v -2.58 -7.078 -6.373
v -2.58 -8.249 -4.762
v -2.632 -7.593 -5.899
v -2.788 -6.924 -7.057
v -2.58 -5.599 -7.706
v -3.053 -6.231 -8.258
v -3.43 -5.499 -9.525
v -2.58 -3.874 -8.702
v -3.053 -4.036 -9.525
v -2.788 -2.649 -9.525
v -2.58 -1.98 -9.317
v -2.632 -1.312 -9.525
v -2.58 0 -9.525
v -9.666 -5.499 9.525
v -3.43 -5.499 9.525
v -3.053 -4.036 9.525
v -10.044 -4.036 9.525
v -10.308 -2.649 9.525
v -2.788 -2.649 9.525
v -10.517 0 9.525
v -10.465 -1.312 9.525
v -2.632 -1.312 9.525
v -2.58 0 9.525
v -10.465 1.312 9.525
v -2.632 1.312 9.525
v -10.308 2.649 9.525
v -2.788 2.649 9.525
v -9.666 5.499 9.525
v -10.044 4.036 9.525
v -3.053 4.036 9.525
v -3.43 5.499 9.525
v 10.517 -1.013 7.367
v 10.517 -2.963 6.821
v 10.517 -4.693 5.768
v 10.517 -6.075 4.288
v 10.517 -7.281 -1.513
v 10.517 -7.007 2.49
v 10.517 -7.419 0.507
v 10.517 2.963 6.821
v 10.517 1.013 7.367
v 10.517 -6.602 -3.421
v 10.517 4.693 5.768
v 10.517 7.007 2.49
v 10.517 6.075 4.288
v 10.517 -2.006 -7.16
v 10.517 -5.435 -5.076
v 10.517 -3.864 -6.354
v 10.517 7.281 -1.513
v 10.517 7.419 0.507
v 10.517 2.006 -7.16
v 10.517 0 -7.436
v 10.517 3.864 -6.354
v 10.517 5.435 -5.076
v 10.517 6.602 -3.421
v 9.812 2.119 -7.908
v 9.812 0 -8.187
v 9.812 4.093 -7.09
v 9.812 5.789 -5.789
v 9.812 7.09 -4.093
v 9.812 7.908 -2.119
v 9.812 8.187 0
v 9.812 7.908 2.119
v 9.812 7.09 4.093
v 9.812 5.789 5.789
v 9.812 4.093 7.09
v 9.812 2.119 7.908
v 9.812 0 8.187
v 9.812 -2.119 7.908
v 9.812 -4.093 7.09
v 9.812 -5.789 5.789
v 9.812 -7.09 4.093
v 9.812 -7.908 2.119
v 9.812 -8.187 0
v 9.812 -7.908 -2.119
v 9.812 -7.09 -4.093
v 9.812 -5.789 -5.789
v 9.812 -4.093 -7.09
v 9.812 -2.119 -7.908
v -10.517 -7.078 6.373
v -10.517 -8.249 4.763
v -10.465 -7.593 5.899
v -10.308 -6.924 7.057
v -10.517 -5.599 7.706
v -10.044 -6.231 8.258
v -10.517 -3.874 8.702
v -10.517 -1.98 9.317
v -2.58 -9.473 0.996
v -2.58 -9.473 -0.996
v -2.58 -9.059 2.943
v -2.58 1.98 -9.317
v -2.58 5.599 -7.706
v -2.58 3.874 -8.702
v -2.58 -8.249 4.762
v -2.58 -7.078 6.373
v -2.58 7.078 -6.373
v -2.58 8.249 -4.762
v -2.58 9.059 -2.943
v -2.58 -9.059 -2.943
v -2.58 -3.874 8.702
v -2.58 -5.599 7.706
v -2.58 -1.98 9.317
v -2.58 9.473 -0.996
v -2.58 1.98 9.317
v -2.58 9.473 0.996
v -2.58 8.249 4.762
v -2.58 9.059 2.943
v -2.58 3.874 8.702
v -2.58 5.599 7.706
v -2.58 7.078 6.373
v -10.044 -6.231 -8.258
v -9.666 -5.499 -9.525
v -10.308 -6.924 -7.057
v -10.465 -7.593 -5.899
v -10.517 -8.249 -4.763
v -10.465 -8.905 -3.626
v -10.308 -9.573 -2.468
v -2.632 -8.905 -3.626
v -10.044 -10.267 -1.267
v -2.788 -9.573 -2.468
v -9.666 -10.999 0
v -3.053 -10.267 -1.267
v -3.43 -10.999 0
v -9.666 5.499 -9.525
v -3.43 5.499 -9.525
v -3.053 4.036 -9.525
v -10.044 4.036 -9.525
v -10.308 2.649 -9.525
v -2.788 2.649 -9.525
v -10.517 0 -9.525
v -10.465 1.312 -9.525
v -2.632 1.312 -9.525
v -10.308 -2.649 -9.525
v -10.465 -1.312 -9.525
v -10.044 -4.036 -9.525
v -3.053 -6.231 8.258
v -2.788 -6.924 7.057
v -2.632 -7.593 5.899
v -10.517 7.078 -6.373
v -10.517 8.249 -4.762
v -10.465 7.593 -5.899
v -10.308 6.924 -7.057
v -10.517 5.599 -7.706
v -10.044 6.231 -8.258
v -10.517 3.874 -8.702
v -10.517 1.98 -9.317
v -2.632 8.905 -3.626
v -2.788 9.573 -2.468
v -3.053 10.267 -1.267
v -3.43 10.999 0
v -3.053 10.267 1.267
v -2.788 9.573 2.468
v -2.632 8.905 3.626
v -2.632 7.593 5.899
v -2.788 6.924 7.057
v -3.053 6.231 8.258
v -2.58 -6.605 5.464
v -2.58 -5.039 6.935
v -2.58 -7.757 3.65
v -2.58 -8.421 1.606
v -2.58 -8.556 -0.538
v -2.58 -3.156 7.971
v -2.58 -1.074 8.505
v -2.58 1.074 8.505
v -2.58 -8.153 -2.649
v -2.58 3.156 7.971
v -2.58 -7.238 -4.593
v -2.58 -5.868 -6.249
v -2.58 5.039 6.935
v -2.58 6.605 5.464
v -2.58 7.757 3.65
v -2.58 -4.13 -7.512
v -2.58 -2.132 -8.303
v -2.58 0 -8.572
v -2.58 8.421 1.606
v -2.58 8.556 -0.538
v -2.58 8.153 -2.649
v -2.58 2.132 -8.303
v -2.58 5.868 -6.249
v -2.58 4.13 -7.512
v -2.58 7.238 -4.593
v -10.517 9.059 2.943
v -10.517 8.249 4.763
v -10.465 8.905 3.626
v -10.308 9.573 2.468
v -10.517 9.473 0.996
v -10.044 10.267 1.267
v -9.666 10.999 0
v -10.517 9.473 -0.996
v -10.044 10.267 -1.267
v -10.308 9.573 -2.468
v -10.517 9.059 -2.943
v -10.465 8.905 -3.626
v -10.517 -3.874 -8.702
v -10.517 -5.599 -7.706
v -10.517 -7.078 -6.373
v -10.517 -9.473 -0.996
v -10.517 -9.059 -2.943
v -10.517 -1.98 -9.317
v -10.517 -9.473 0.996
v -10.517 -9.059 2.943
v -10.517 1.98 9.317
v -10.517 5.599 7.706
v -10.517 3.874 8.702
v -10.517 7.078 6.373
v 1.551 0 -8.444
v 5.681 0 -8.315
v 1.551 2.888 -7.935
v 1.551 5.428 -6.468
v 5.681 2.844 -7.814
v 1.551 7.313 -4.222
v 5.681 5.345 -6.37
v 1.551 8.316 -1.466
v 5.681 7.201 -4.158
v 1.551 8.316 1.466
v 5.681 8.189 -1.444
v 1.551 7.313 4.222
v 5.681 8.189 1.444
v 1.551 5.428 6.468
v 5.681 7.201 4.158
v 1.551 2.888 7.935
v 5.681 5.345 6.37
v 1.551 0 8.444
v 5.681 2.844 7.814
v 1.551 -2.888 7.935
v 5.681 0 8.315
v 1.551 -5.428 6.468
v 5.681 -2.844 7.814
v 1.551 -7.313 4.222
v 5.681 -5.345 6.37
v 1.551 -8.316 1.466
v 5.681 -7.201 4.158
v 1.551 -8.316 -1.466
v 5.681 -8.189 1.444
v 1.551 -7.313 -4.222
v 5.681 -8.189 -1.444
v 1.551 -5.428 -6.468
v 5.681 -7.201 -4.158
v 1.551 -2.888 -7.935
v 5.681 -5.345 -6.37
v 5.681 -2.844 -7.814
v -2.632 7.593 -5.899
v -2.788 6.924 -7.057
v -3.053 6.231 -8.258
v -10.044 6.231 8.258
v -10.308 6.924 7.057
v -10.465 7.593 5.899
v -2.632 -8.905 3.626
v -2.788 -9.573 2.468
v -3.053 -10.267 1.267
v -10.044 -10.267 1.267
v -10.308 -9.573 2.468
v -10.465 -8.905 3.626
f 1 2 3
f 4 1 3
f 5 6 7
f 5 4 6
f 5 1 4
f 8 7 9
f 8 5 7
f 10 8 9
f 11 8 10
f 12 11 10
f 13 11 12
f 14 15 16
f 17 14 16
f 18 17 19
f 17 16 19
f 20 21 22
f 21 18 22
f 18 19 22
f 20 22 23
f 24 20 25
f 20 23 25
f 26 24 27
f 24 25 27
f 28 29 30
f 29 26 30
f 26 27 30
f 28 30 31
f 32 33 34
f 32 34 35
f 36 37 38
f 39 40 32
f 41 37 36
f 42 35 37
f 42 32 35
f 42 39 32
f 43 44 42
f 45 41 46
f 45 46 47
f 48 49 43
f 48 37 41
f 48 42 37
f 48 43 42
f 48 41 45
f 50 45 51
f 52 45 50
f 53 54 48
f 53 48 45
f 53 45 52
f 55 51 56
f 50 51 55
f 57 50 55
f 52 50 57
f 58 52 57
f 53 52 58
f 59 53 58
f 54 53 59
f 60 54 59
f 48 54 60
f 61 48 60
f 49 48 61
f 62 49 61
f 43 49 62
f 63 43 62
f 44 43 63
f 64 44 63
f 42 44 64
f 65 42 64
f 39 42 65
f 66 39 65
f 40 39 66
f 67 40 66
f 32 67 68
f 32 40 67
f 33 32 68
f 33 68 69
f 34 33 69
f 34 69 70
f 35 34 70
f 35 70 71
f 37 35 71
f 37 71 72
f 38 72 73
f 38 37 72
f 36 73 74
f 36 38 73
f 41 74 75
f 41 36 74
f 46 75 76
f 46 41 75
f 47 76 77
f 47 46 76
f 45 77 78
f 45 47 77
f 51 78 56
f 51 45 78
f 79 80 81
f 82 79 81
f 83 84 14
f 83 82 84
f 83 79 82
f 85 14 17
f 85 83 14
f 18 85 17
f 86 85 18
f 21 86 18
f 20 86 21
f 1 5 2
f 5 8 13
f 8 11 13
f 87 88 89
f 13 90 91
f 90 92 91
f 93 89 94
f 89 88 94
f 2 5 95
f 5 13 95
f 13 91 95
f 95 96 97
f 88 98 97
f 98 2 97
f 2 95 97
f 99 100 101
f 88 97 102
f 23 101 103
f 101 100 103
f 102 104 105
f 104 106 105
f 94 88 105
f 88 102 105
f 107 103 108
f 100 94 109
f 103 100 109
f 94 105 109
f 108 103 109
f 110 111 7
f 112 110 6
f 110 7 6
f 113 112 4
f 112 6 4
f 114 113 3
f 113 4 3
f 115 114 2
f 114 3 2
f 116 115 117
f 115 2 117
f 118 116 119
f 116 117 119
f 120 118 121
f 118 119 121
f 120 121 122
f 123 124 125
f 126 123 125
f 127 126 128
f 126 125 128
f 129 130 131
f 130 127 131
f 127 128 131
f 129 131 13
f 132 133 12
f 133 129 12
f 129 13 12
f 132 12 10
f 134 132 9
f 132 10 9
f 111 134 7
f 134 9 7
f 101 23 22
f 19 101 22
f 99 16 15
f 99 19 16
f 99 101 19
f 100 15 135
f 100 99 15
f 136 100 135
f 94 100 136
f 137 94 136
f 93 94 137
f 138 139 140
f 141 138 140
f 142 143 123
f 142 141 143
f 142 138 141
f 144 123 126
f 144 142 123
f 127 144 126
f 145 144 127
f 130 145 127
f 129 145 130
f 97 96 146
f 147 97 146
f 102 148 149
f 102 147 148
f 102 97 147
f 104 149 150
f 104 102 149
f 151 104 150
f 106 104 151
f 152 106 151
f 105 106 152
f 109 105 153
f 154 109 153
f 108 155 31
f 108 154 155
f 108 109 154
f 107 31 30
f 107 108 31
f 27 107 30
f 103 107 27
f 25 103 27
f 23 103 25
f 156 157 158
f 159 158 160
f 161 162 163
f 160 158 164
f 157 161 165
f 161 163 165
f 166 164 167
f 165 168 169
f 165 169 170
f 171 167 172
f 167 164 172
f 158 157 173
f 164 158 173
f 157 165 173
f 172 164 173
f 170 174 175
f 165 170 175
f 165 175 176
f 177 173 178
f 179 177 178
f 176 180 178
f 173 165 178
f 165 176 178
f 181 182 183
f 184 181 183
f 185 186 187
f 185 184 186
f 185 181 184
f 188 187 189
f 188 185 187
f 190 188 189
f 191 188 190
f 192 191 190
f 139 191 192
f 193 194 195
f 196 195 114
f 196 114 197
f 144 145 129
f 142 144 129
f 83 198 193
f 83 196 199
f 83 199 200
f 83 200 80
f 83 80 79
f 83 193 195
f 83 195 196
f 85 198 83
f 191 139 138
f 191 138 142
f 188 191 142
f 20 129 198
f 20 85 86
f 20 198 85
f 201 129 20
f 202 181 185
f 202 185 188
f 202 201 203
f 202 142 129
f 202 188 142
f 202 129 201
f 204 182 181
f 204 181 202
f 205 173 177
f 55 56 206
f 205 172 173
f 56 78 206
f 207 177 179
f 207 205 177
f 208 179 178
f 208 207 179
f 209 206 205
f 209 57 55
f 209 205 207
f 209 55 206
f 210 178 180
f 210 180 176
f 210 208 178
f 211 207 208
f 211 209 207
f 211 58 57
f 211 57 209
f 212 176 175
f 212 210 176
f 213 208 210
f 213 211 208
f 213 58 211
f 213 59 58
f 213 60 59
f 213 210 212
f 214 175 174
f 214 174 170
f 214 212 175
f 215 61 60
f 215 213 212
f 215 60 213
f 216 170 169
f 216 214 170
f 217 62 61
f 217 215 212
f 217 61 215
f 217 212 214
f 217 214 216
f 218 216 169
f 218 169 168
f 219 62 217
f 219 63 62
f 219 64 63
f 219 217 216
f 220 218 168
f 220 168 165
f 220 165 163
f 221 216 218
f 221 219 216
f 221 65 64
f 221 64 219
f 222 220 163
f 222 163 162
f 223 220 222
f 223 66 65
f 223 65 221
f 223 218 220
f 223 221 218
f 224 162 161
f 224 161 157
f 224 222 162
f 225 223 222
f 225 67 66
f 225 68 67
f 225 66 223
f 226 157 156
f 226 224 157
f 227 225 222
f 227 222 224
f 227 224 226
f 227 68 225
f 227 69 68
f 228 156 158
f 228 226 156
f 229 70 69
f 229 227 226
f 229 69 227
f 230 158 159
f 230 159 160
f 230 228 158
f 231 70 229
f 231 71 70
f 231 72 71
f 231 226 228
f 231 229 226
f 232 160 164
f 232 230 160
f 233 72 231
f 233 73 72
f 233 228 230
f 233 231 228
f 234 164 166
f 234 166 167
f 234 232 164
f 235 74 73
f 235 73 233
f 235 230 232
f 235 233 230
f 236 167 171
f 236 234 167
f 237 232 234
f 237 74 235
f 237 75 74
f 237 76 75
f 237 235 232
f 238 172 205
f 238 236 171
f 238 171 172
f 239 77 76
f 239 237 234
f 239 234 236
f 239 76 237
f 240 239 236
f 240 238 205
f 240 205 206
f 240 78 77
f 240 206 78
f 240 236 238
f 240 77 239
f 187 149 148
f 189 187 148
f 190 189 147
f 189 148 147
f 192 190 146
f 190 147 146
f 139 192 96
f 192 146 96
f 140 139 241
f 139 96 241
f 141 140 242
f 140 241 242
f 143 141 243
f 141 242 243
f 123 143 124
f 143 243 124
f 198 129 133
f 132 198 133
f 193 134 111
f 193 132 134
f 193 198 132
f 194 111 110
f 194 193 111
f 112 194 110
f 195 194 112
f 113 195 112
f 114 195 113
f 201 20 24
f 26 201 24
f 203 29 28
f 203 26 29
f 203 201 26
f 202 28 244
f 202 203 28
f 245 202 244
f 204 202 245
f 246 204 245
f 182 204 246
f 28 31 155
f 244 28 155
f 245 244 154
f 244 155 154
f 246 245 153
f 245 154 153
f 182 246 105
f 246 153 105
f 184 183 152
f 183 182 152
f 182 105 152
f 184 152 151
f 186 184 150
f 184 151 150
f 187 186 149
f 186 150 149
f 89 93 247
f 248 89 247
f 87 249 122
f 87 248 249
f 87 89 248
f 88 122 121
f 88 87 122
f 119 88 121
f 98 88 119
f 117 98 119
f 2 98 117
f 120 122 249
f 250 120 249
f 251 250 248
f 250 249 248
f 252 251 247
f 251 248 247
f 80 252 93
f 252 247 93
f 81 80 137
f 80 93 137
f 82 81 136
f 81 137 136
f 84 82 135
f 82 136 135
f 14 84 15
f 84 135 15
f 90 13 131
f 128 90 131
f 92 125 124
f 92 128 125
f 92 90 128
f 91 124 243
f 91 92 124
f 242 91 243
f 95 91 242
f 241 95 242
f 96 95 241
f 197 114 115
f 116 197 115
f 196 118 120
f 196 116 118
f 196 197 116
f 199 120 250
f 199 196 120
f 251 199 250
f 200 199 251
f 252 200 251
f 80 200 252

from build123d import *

# Parameters (mm, degrees)
SKETCH2_R          = 8.164727576
EXTRUDE1_DEPTH     = 13.096875
EXTRUDE1_DRAFT     = 1.783333333
EXTRUDE2_DEPTH     = 7.9375
SKETCH7_OUTSIDE_W  = 120.294
SKETCH7_OUTSIDE_H  = 123.242
SKETCH7_OUTSIDE_R  = 9.525
CUT_EXTRUDE1_DEPTH = 26.576122784
CUT_EXTRUDE1_DRAFT = -60
SKETCH8_OUTSIDE_W  = 99.508
SKETCH8_OUTSIDE_H  = 102.456
SKETCH8_OUTSIDE_R  = 9.525
CUT_EXTRUDE2_DEPTH = 20.576037898
CUT_EXTRUDE2_DRAFT = -60
CHAMFER1_SIZE      = 0.705555556
CHAMFER1_SIZE2     = 0.728581919


with BuildPart() as part:
    # Sketch2 → Extrude1 (with draft: the straight prism first)
    with BuildSketch(Plane(origin=(10.5171875, 0, 0), x_dir=(0, 0, -1), z_dir=(1, 0, 0))):
        Circle(SKETCH2_R)
    extrude(amount=-EXTRUDE1_DEPTH)
    # Extrude1: the draft: its side faces are tilted about the plane it starts from
    extrude1_sides = [part.faces().sort_by_distance(p)[0] for p in [
        (3.96875, 0, 8.164727576),
    ]]
    draft(extrude1_sides, Plane(origin=(10.5171875, 0, 0), x_dir=(0, 0, -1), z_dir=(1, 0, 0)), EXTRUDE1_DRAFT)

    # Chamfer1
    chamfer1_edges = [part.edges().sort_by_distance(p)[0] for p in [
        (10.5171875, 0, 8.164727576),
    ]]
    chamfer1_side = [part.faces().sort_by_distance(p)[0] for p in [
        (3.96875, 0, 8.368613788),
    ]]
    chamfer(chamfer1_edges, length=CHAMFER1_SIZE, length2=CHAMFER1_SIZE2, reference=chamfer1_side[0])


with BuildPart() as body_2:
    # Sketch6 → Extrude2 (new body)
    with BuildSketch(Plane.ZY.offset(2.5796875)):
        Polygon((0, 10.998522628), (-9.525, 5.499261314), (-9.525, -5.499261314), (0, -10.998522628), (9.525, -5.499261314), (9.525, 5.499261314), align=None)
    extrude(amount=EXTRUDE2_DEPTH)


with BuildPart() as cut_extrude1_tool:
    # Sketch7 outside → Cut-Extrude1 (with draft: the straight prism first)
    with BuildSketch(Plane.ZY.offset(10.5171875)):
        Rectangle(SKETCH7_OUTSIDE_W, SKETCH7_OUTSIDE_H)
        Circle(SKETCH7_OUTSIDE_R, mode=Mode.SUBTRACT)
    extrude(amount=-CUT_EXTRUDE1_DEPTH)
    # Cut-Extrude1: the draft: its side faces are tilted about the plane it starts from
    cut_extrude1_sides = [cut_extrude1_tool.faces().sort_by_distance(p)[0] for p in [
        (2.770873892, -61.621, 0),
        (2.770873892, 0, 60.147),
        (2.770873892, 61.621, 0),
        (2.770873892, 0, -60.147),
        (2.770873892, 0, -9.525),
    ]]
    draft(cut_extrude1_sides, Plane.ZY.offset(10.5171875), CUT_EXTRUDE1_DRAFT)


with BuildPart() as body_2_1:
    add(body_2.part)

    # Cut-Extrude1: cut by cut_extrude1_tool
    add(cut_extrude1_tool.part, mode=Mode.SUBTRACT)


with BuildPart() as cut_extrude2_tool:
    # Sketch8 outside → Cut-Extrude2 (with draft: the straight prism first)
    with BuildSketch(Plane(origin=(-2.5796875, 0, 0), x_dir=(0, 0, -1), z_dir=(1, 0, 0))):
        Rectangle(SKETCH8_OUTSIDE_W, SKETCH8_OUTSIDE_H)
        Circle(SKETCH8_OUTSIDE_R, mode=Mode.SUBTRACT)
    extrude(amount=-CUT_EXTRUDE2_DEPTH)
    # Cut-Extrude2: the draft: its side faces are tilted about the plane it starts from
    cut_extrude2_sides = [cut_extrude2_tool.faces().sort_by_distance(p)[0] for p in [
        (-12.867706449, -51.228, 0),
        (-12.867706449, 0, -49.754),
        (-12.867706449, 51.228, 0),
        (-12.867706449, 0, 49.754),
        (-12.867706449, 0, 9.525),
    ]]
    draft(cut_extrude2_sides, Plane(origin=(-2.5796875, 0, 0), x_dir=(0, 0, -1), z_dir=(1, 0, 0)), CUT_EXTRUDE2_DRAFT)


with BuildPart() as body_2_2:
    add(body_2_1.part)

    # Cut-Extrude2: cut by cut_extrude2_tool
    add(cut_extrude2_tool.part, mode=Mode.SUBTRACT)


solid = Compound([part.part, body_2_2.part])
